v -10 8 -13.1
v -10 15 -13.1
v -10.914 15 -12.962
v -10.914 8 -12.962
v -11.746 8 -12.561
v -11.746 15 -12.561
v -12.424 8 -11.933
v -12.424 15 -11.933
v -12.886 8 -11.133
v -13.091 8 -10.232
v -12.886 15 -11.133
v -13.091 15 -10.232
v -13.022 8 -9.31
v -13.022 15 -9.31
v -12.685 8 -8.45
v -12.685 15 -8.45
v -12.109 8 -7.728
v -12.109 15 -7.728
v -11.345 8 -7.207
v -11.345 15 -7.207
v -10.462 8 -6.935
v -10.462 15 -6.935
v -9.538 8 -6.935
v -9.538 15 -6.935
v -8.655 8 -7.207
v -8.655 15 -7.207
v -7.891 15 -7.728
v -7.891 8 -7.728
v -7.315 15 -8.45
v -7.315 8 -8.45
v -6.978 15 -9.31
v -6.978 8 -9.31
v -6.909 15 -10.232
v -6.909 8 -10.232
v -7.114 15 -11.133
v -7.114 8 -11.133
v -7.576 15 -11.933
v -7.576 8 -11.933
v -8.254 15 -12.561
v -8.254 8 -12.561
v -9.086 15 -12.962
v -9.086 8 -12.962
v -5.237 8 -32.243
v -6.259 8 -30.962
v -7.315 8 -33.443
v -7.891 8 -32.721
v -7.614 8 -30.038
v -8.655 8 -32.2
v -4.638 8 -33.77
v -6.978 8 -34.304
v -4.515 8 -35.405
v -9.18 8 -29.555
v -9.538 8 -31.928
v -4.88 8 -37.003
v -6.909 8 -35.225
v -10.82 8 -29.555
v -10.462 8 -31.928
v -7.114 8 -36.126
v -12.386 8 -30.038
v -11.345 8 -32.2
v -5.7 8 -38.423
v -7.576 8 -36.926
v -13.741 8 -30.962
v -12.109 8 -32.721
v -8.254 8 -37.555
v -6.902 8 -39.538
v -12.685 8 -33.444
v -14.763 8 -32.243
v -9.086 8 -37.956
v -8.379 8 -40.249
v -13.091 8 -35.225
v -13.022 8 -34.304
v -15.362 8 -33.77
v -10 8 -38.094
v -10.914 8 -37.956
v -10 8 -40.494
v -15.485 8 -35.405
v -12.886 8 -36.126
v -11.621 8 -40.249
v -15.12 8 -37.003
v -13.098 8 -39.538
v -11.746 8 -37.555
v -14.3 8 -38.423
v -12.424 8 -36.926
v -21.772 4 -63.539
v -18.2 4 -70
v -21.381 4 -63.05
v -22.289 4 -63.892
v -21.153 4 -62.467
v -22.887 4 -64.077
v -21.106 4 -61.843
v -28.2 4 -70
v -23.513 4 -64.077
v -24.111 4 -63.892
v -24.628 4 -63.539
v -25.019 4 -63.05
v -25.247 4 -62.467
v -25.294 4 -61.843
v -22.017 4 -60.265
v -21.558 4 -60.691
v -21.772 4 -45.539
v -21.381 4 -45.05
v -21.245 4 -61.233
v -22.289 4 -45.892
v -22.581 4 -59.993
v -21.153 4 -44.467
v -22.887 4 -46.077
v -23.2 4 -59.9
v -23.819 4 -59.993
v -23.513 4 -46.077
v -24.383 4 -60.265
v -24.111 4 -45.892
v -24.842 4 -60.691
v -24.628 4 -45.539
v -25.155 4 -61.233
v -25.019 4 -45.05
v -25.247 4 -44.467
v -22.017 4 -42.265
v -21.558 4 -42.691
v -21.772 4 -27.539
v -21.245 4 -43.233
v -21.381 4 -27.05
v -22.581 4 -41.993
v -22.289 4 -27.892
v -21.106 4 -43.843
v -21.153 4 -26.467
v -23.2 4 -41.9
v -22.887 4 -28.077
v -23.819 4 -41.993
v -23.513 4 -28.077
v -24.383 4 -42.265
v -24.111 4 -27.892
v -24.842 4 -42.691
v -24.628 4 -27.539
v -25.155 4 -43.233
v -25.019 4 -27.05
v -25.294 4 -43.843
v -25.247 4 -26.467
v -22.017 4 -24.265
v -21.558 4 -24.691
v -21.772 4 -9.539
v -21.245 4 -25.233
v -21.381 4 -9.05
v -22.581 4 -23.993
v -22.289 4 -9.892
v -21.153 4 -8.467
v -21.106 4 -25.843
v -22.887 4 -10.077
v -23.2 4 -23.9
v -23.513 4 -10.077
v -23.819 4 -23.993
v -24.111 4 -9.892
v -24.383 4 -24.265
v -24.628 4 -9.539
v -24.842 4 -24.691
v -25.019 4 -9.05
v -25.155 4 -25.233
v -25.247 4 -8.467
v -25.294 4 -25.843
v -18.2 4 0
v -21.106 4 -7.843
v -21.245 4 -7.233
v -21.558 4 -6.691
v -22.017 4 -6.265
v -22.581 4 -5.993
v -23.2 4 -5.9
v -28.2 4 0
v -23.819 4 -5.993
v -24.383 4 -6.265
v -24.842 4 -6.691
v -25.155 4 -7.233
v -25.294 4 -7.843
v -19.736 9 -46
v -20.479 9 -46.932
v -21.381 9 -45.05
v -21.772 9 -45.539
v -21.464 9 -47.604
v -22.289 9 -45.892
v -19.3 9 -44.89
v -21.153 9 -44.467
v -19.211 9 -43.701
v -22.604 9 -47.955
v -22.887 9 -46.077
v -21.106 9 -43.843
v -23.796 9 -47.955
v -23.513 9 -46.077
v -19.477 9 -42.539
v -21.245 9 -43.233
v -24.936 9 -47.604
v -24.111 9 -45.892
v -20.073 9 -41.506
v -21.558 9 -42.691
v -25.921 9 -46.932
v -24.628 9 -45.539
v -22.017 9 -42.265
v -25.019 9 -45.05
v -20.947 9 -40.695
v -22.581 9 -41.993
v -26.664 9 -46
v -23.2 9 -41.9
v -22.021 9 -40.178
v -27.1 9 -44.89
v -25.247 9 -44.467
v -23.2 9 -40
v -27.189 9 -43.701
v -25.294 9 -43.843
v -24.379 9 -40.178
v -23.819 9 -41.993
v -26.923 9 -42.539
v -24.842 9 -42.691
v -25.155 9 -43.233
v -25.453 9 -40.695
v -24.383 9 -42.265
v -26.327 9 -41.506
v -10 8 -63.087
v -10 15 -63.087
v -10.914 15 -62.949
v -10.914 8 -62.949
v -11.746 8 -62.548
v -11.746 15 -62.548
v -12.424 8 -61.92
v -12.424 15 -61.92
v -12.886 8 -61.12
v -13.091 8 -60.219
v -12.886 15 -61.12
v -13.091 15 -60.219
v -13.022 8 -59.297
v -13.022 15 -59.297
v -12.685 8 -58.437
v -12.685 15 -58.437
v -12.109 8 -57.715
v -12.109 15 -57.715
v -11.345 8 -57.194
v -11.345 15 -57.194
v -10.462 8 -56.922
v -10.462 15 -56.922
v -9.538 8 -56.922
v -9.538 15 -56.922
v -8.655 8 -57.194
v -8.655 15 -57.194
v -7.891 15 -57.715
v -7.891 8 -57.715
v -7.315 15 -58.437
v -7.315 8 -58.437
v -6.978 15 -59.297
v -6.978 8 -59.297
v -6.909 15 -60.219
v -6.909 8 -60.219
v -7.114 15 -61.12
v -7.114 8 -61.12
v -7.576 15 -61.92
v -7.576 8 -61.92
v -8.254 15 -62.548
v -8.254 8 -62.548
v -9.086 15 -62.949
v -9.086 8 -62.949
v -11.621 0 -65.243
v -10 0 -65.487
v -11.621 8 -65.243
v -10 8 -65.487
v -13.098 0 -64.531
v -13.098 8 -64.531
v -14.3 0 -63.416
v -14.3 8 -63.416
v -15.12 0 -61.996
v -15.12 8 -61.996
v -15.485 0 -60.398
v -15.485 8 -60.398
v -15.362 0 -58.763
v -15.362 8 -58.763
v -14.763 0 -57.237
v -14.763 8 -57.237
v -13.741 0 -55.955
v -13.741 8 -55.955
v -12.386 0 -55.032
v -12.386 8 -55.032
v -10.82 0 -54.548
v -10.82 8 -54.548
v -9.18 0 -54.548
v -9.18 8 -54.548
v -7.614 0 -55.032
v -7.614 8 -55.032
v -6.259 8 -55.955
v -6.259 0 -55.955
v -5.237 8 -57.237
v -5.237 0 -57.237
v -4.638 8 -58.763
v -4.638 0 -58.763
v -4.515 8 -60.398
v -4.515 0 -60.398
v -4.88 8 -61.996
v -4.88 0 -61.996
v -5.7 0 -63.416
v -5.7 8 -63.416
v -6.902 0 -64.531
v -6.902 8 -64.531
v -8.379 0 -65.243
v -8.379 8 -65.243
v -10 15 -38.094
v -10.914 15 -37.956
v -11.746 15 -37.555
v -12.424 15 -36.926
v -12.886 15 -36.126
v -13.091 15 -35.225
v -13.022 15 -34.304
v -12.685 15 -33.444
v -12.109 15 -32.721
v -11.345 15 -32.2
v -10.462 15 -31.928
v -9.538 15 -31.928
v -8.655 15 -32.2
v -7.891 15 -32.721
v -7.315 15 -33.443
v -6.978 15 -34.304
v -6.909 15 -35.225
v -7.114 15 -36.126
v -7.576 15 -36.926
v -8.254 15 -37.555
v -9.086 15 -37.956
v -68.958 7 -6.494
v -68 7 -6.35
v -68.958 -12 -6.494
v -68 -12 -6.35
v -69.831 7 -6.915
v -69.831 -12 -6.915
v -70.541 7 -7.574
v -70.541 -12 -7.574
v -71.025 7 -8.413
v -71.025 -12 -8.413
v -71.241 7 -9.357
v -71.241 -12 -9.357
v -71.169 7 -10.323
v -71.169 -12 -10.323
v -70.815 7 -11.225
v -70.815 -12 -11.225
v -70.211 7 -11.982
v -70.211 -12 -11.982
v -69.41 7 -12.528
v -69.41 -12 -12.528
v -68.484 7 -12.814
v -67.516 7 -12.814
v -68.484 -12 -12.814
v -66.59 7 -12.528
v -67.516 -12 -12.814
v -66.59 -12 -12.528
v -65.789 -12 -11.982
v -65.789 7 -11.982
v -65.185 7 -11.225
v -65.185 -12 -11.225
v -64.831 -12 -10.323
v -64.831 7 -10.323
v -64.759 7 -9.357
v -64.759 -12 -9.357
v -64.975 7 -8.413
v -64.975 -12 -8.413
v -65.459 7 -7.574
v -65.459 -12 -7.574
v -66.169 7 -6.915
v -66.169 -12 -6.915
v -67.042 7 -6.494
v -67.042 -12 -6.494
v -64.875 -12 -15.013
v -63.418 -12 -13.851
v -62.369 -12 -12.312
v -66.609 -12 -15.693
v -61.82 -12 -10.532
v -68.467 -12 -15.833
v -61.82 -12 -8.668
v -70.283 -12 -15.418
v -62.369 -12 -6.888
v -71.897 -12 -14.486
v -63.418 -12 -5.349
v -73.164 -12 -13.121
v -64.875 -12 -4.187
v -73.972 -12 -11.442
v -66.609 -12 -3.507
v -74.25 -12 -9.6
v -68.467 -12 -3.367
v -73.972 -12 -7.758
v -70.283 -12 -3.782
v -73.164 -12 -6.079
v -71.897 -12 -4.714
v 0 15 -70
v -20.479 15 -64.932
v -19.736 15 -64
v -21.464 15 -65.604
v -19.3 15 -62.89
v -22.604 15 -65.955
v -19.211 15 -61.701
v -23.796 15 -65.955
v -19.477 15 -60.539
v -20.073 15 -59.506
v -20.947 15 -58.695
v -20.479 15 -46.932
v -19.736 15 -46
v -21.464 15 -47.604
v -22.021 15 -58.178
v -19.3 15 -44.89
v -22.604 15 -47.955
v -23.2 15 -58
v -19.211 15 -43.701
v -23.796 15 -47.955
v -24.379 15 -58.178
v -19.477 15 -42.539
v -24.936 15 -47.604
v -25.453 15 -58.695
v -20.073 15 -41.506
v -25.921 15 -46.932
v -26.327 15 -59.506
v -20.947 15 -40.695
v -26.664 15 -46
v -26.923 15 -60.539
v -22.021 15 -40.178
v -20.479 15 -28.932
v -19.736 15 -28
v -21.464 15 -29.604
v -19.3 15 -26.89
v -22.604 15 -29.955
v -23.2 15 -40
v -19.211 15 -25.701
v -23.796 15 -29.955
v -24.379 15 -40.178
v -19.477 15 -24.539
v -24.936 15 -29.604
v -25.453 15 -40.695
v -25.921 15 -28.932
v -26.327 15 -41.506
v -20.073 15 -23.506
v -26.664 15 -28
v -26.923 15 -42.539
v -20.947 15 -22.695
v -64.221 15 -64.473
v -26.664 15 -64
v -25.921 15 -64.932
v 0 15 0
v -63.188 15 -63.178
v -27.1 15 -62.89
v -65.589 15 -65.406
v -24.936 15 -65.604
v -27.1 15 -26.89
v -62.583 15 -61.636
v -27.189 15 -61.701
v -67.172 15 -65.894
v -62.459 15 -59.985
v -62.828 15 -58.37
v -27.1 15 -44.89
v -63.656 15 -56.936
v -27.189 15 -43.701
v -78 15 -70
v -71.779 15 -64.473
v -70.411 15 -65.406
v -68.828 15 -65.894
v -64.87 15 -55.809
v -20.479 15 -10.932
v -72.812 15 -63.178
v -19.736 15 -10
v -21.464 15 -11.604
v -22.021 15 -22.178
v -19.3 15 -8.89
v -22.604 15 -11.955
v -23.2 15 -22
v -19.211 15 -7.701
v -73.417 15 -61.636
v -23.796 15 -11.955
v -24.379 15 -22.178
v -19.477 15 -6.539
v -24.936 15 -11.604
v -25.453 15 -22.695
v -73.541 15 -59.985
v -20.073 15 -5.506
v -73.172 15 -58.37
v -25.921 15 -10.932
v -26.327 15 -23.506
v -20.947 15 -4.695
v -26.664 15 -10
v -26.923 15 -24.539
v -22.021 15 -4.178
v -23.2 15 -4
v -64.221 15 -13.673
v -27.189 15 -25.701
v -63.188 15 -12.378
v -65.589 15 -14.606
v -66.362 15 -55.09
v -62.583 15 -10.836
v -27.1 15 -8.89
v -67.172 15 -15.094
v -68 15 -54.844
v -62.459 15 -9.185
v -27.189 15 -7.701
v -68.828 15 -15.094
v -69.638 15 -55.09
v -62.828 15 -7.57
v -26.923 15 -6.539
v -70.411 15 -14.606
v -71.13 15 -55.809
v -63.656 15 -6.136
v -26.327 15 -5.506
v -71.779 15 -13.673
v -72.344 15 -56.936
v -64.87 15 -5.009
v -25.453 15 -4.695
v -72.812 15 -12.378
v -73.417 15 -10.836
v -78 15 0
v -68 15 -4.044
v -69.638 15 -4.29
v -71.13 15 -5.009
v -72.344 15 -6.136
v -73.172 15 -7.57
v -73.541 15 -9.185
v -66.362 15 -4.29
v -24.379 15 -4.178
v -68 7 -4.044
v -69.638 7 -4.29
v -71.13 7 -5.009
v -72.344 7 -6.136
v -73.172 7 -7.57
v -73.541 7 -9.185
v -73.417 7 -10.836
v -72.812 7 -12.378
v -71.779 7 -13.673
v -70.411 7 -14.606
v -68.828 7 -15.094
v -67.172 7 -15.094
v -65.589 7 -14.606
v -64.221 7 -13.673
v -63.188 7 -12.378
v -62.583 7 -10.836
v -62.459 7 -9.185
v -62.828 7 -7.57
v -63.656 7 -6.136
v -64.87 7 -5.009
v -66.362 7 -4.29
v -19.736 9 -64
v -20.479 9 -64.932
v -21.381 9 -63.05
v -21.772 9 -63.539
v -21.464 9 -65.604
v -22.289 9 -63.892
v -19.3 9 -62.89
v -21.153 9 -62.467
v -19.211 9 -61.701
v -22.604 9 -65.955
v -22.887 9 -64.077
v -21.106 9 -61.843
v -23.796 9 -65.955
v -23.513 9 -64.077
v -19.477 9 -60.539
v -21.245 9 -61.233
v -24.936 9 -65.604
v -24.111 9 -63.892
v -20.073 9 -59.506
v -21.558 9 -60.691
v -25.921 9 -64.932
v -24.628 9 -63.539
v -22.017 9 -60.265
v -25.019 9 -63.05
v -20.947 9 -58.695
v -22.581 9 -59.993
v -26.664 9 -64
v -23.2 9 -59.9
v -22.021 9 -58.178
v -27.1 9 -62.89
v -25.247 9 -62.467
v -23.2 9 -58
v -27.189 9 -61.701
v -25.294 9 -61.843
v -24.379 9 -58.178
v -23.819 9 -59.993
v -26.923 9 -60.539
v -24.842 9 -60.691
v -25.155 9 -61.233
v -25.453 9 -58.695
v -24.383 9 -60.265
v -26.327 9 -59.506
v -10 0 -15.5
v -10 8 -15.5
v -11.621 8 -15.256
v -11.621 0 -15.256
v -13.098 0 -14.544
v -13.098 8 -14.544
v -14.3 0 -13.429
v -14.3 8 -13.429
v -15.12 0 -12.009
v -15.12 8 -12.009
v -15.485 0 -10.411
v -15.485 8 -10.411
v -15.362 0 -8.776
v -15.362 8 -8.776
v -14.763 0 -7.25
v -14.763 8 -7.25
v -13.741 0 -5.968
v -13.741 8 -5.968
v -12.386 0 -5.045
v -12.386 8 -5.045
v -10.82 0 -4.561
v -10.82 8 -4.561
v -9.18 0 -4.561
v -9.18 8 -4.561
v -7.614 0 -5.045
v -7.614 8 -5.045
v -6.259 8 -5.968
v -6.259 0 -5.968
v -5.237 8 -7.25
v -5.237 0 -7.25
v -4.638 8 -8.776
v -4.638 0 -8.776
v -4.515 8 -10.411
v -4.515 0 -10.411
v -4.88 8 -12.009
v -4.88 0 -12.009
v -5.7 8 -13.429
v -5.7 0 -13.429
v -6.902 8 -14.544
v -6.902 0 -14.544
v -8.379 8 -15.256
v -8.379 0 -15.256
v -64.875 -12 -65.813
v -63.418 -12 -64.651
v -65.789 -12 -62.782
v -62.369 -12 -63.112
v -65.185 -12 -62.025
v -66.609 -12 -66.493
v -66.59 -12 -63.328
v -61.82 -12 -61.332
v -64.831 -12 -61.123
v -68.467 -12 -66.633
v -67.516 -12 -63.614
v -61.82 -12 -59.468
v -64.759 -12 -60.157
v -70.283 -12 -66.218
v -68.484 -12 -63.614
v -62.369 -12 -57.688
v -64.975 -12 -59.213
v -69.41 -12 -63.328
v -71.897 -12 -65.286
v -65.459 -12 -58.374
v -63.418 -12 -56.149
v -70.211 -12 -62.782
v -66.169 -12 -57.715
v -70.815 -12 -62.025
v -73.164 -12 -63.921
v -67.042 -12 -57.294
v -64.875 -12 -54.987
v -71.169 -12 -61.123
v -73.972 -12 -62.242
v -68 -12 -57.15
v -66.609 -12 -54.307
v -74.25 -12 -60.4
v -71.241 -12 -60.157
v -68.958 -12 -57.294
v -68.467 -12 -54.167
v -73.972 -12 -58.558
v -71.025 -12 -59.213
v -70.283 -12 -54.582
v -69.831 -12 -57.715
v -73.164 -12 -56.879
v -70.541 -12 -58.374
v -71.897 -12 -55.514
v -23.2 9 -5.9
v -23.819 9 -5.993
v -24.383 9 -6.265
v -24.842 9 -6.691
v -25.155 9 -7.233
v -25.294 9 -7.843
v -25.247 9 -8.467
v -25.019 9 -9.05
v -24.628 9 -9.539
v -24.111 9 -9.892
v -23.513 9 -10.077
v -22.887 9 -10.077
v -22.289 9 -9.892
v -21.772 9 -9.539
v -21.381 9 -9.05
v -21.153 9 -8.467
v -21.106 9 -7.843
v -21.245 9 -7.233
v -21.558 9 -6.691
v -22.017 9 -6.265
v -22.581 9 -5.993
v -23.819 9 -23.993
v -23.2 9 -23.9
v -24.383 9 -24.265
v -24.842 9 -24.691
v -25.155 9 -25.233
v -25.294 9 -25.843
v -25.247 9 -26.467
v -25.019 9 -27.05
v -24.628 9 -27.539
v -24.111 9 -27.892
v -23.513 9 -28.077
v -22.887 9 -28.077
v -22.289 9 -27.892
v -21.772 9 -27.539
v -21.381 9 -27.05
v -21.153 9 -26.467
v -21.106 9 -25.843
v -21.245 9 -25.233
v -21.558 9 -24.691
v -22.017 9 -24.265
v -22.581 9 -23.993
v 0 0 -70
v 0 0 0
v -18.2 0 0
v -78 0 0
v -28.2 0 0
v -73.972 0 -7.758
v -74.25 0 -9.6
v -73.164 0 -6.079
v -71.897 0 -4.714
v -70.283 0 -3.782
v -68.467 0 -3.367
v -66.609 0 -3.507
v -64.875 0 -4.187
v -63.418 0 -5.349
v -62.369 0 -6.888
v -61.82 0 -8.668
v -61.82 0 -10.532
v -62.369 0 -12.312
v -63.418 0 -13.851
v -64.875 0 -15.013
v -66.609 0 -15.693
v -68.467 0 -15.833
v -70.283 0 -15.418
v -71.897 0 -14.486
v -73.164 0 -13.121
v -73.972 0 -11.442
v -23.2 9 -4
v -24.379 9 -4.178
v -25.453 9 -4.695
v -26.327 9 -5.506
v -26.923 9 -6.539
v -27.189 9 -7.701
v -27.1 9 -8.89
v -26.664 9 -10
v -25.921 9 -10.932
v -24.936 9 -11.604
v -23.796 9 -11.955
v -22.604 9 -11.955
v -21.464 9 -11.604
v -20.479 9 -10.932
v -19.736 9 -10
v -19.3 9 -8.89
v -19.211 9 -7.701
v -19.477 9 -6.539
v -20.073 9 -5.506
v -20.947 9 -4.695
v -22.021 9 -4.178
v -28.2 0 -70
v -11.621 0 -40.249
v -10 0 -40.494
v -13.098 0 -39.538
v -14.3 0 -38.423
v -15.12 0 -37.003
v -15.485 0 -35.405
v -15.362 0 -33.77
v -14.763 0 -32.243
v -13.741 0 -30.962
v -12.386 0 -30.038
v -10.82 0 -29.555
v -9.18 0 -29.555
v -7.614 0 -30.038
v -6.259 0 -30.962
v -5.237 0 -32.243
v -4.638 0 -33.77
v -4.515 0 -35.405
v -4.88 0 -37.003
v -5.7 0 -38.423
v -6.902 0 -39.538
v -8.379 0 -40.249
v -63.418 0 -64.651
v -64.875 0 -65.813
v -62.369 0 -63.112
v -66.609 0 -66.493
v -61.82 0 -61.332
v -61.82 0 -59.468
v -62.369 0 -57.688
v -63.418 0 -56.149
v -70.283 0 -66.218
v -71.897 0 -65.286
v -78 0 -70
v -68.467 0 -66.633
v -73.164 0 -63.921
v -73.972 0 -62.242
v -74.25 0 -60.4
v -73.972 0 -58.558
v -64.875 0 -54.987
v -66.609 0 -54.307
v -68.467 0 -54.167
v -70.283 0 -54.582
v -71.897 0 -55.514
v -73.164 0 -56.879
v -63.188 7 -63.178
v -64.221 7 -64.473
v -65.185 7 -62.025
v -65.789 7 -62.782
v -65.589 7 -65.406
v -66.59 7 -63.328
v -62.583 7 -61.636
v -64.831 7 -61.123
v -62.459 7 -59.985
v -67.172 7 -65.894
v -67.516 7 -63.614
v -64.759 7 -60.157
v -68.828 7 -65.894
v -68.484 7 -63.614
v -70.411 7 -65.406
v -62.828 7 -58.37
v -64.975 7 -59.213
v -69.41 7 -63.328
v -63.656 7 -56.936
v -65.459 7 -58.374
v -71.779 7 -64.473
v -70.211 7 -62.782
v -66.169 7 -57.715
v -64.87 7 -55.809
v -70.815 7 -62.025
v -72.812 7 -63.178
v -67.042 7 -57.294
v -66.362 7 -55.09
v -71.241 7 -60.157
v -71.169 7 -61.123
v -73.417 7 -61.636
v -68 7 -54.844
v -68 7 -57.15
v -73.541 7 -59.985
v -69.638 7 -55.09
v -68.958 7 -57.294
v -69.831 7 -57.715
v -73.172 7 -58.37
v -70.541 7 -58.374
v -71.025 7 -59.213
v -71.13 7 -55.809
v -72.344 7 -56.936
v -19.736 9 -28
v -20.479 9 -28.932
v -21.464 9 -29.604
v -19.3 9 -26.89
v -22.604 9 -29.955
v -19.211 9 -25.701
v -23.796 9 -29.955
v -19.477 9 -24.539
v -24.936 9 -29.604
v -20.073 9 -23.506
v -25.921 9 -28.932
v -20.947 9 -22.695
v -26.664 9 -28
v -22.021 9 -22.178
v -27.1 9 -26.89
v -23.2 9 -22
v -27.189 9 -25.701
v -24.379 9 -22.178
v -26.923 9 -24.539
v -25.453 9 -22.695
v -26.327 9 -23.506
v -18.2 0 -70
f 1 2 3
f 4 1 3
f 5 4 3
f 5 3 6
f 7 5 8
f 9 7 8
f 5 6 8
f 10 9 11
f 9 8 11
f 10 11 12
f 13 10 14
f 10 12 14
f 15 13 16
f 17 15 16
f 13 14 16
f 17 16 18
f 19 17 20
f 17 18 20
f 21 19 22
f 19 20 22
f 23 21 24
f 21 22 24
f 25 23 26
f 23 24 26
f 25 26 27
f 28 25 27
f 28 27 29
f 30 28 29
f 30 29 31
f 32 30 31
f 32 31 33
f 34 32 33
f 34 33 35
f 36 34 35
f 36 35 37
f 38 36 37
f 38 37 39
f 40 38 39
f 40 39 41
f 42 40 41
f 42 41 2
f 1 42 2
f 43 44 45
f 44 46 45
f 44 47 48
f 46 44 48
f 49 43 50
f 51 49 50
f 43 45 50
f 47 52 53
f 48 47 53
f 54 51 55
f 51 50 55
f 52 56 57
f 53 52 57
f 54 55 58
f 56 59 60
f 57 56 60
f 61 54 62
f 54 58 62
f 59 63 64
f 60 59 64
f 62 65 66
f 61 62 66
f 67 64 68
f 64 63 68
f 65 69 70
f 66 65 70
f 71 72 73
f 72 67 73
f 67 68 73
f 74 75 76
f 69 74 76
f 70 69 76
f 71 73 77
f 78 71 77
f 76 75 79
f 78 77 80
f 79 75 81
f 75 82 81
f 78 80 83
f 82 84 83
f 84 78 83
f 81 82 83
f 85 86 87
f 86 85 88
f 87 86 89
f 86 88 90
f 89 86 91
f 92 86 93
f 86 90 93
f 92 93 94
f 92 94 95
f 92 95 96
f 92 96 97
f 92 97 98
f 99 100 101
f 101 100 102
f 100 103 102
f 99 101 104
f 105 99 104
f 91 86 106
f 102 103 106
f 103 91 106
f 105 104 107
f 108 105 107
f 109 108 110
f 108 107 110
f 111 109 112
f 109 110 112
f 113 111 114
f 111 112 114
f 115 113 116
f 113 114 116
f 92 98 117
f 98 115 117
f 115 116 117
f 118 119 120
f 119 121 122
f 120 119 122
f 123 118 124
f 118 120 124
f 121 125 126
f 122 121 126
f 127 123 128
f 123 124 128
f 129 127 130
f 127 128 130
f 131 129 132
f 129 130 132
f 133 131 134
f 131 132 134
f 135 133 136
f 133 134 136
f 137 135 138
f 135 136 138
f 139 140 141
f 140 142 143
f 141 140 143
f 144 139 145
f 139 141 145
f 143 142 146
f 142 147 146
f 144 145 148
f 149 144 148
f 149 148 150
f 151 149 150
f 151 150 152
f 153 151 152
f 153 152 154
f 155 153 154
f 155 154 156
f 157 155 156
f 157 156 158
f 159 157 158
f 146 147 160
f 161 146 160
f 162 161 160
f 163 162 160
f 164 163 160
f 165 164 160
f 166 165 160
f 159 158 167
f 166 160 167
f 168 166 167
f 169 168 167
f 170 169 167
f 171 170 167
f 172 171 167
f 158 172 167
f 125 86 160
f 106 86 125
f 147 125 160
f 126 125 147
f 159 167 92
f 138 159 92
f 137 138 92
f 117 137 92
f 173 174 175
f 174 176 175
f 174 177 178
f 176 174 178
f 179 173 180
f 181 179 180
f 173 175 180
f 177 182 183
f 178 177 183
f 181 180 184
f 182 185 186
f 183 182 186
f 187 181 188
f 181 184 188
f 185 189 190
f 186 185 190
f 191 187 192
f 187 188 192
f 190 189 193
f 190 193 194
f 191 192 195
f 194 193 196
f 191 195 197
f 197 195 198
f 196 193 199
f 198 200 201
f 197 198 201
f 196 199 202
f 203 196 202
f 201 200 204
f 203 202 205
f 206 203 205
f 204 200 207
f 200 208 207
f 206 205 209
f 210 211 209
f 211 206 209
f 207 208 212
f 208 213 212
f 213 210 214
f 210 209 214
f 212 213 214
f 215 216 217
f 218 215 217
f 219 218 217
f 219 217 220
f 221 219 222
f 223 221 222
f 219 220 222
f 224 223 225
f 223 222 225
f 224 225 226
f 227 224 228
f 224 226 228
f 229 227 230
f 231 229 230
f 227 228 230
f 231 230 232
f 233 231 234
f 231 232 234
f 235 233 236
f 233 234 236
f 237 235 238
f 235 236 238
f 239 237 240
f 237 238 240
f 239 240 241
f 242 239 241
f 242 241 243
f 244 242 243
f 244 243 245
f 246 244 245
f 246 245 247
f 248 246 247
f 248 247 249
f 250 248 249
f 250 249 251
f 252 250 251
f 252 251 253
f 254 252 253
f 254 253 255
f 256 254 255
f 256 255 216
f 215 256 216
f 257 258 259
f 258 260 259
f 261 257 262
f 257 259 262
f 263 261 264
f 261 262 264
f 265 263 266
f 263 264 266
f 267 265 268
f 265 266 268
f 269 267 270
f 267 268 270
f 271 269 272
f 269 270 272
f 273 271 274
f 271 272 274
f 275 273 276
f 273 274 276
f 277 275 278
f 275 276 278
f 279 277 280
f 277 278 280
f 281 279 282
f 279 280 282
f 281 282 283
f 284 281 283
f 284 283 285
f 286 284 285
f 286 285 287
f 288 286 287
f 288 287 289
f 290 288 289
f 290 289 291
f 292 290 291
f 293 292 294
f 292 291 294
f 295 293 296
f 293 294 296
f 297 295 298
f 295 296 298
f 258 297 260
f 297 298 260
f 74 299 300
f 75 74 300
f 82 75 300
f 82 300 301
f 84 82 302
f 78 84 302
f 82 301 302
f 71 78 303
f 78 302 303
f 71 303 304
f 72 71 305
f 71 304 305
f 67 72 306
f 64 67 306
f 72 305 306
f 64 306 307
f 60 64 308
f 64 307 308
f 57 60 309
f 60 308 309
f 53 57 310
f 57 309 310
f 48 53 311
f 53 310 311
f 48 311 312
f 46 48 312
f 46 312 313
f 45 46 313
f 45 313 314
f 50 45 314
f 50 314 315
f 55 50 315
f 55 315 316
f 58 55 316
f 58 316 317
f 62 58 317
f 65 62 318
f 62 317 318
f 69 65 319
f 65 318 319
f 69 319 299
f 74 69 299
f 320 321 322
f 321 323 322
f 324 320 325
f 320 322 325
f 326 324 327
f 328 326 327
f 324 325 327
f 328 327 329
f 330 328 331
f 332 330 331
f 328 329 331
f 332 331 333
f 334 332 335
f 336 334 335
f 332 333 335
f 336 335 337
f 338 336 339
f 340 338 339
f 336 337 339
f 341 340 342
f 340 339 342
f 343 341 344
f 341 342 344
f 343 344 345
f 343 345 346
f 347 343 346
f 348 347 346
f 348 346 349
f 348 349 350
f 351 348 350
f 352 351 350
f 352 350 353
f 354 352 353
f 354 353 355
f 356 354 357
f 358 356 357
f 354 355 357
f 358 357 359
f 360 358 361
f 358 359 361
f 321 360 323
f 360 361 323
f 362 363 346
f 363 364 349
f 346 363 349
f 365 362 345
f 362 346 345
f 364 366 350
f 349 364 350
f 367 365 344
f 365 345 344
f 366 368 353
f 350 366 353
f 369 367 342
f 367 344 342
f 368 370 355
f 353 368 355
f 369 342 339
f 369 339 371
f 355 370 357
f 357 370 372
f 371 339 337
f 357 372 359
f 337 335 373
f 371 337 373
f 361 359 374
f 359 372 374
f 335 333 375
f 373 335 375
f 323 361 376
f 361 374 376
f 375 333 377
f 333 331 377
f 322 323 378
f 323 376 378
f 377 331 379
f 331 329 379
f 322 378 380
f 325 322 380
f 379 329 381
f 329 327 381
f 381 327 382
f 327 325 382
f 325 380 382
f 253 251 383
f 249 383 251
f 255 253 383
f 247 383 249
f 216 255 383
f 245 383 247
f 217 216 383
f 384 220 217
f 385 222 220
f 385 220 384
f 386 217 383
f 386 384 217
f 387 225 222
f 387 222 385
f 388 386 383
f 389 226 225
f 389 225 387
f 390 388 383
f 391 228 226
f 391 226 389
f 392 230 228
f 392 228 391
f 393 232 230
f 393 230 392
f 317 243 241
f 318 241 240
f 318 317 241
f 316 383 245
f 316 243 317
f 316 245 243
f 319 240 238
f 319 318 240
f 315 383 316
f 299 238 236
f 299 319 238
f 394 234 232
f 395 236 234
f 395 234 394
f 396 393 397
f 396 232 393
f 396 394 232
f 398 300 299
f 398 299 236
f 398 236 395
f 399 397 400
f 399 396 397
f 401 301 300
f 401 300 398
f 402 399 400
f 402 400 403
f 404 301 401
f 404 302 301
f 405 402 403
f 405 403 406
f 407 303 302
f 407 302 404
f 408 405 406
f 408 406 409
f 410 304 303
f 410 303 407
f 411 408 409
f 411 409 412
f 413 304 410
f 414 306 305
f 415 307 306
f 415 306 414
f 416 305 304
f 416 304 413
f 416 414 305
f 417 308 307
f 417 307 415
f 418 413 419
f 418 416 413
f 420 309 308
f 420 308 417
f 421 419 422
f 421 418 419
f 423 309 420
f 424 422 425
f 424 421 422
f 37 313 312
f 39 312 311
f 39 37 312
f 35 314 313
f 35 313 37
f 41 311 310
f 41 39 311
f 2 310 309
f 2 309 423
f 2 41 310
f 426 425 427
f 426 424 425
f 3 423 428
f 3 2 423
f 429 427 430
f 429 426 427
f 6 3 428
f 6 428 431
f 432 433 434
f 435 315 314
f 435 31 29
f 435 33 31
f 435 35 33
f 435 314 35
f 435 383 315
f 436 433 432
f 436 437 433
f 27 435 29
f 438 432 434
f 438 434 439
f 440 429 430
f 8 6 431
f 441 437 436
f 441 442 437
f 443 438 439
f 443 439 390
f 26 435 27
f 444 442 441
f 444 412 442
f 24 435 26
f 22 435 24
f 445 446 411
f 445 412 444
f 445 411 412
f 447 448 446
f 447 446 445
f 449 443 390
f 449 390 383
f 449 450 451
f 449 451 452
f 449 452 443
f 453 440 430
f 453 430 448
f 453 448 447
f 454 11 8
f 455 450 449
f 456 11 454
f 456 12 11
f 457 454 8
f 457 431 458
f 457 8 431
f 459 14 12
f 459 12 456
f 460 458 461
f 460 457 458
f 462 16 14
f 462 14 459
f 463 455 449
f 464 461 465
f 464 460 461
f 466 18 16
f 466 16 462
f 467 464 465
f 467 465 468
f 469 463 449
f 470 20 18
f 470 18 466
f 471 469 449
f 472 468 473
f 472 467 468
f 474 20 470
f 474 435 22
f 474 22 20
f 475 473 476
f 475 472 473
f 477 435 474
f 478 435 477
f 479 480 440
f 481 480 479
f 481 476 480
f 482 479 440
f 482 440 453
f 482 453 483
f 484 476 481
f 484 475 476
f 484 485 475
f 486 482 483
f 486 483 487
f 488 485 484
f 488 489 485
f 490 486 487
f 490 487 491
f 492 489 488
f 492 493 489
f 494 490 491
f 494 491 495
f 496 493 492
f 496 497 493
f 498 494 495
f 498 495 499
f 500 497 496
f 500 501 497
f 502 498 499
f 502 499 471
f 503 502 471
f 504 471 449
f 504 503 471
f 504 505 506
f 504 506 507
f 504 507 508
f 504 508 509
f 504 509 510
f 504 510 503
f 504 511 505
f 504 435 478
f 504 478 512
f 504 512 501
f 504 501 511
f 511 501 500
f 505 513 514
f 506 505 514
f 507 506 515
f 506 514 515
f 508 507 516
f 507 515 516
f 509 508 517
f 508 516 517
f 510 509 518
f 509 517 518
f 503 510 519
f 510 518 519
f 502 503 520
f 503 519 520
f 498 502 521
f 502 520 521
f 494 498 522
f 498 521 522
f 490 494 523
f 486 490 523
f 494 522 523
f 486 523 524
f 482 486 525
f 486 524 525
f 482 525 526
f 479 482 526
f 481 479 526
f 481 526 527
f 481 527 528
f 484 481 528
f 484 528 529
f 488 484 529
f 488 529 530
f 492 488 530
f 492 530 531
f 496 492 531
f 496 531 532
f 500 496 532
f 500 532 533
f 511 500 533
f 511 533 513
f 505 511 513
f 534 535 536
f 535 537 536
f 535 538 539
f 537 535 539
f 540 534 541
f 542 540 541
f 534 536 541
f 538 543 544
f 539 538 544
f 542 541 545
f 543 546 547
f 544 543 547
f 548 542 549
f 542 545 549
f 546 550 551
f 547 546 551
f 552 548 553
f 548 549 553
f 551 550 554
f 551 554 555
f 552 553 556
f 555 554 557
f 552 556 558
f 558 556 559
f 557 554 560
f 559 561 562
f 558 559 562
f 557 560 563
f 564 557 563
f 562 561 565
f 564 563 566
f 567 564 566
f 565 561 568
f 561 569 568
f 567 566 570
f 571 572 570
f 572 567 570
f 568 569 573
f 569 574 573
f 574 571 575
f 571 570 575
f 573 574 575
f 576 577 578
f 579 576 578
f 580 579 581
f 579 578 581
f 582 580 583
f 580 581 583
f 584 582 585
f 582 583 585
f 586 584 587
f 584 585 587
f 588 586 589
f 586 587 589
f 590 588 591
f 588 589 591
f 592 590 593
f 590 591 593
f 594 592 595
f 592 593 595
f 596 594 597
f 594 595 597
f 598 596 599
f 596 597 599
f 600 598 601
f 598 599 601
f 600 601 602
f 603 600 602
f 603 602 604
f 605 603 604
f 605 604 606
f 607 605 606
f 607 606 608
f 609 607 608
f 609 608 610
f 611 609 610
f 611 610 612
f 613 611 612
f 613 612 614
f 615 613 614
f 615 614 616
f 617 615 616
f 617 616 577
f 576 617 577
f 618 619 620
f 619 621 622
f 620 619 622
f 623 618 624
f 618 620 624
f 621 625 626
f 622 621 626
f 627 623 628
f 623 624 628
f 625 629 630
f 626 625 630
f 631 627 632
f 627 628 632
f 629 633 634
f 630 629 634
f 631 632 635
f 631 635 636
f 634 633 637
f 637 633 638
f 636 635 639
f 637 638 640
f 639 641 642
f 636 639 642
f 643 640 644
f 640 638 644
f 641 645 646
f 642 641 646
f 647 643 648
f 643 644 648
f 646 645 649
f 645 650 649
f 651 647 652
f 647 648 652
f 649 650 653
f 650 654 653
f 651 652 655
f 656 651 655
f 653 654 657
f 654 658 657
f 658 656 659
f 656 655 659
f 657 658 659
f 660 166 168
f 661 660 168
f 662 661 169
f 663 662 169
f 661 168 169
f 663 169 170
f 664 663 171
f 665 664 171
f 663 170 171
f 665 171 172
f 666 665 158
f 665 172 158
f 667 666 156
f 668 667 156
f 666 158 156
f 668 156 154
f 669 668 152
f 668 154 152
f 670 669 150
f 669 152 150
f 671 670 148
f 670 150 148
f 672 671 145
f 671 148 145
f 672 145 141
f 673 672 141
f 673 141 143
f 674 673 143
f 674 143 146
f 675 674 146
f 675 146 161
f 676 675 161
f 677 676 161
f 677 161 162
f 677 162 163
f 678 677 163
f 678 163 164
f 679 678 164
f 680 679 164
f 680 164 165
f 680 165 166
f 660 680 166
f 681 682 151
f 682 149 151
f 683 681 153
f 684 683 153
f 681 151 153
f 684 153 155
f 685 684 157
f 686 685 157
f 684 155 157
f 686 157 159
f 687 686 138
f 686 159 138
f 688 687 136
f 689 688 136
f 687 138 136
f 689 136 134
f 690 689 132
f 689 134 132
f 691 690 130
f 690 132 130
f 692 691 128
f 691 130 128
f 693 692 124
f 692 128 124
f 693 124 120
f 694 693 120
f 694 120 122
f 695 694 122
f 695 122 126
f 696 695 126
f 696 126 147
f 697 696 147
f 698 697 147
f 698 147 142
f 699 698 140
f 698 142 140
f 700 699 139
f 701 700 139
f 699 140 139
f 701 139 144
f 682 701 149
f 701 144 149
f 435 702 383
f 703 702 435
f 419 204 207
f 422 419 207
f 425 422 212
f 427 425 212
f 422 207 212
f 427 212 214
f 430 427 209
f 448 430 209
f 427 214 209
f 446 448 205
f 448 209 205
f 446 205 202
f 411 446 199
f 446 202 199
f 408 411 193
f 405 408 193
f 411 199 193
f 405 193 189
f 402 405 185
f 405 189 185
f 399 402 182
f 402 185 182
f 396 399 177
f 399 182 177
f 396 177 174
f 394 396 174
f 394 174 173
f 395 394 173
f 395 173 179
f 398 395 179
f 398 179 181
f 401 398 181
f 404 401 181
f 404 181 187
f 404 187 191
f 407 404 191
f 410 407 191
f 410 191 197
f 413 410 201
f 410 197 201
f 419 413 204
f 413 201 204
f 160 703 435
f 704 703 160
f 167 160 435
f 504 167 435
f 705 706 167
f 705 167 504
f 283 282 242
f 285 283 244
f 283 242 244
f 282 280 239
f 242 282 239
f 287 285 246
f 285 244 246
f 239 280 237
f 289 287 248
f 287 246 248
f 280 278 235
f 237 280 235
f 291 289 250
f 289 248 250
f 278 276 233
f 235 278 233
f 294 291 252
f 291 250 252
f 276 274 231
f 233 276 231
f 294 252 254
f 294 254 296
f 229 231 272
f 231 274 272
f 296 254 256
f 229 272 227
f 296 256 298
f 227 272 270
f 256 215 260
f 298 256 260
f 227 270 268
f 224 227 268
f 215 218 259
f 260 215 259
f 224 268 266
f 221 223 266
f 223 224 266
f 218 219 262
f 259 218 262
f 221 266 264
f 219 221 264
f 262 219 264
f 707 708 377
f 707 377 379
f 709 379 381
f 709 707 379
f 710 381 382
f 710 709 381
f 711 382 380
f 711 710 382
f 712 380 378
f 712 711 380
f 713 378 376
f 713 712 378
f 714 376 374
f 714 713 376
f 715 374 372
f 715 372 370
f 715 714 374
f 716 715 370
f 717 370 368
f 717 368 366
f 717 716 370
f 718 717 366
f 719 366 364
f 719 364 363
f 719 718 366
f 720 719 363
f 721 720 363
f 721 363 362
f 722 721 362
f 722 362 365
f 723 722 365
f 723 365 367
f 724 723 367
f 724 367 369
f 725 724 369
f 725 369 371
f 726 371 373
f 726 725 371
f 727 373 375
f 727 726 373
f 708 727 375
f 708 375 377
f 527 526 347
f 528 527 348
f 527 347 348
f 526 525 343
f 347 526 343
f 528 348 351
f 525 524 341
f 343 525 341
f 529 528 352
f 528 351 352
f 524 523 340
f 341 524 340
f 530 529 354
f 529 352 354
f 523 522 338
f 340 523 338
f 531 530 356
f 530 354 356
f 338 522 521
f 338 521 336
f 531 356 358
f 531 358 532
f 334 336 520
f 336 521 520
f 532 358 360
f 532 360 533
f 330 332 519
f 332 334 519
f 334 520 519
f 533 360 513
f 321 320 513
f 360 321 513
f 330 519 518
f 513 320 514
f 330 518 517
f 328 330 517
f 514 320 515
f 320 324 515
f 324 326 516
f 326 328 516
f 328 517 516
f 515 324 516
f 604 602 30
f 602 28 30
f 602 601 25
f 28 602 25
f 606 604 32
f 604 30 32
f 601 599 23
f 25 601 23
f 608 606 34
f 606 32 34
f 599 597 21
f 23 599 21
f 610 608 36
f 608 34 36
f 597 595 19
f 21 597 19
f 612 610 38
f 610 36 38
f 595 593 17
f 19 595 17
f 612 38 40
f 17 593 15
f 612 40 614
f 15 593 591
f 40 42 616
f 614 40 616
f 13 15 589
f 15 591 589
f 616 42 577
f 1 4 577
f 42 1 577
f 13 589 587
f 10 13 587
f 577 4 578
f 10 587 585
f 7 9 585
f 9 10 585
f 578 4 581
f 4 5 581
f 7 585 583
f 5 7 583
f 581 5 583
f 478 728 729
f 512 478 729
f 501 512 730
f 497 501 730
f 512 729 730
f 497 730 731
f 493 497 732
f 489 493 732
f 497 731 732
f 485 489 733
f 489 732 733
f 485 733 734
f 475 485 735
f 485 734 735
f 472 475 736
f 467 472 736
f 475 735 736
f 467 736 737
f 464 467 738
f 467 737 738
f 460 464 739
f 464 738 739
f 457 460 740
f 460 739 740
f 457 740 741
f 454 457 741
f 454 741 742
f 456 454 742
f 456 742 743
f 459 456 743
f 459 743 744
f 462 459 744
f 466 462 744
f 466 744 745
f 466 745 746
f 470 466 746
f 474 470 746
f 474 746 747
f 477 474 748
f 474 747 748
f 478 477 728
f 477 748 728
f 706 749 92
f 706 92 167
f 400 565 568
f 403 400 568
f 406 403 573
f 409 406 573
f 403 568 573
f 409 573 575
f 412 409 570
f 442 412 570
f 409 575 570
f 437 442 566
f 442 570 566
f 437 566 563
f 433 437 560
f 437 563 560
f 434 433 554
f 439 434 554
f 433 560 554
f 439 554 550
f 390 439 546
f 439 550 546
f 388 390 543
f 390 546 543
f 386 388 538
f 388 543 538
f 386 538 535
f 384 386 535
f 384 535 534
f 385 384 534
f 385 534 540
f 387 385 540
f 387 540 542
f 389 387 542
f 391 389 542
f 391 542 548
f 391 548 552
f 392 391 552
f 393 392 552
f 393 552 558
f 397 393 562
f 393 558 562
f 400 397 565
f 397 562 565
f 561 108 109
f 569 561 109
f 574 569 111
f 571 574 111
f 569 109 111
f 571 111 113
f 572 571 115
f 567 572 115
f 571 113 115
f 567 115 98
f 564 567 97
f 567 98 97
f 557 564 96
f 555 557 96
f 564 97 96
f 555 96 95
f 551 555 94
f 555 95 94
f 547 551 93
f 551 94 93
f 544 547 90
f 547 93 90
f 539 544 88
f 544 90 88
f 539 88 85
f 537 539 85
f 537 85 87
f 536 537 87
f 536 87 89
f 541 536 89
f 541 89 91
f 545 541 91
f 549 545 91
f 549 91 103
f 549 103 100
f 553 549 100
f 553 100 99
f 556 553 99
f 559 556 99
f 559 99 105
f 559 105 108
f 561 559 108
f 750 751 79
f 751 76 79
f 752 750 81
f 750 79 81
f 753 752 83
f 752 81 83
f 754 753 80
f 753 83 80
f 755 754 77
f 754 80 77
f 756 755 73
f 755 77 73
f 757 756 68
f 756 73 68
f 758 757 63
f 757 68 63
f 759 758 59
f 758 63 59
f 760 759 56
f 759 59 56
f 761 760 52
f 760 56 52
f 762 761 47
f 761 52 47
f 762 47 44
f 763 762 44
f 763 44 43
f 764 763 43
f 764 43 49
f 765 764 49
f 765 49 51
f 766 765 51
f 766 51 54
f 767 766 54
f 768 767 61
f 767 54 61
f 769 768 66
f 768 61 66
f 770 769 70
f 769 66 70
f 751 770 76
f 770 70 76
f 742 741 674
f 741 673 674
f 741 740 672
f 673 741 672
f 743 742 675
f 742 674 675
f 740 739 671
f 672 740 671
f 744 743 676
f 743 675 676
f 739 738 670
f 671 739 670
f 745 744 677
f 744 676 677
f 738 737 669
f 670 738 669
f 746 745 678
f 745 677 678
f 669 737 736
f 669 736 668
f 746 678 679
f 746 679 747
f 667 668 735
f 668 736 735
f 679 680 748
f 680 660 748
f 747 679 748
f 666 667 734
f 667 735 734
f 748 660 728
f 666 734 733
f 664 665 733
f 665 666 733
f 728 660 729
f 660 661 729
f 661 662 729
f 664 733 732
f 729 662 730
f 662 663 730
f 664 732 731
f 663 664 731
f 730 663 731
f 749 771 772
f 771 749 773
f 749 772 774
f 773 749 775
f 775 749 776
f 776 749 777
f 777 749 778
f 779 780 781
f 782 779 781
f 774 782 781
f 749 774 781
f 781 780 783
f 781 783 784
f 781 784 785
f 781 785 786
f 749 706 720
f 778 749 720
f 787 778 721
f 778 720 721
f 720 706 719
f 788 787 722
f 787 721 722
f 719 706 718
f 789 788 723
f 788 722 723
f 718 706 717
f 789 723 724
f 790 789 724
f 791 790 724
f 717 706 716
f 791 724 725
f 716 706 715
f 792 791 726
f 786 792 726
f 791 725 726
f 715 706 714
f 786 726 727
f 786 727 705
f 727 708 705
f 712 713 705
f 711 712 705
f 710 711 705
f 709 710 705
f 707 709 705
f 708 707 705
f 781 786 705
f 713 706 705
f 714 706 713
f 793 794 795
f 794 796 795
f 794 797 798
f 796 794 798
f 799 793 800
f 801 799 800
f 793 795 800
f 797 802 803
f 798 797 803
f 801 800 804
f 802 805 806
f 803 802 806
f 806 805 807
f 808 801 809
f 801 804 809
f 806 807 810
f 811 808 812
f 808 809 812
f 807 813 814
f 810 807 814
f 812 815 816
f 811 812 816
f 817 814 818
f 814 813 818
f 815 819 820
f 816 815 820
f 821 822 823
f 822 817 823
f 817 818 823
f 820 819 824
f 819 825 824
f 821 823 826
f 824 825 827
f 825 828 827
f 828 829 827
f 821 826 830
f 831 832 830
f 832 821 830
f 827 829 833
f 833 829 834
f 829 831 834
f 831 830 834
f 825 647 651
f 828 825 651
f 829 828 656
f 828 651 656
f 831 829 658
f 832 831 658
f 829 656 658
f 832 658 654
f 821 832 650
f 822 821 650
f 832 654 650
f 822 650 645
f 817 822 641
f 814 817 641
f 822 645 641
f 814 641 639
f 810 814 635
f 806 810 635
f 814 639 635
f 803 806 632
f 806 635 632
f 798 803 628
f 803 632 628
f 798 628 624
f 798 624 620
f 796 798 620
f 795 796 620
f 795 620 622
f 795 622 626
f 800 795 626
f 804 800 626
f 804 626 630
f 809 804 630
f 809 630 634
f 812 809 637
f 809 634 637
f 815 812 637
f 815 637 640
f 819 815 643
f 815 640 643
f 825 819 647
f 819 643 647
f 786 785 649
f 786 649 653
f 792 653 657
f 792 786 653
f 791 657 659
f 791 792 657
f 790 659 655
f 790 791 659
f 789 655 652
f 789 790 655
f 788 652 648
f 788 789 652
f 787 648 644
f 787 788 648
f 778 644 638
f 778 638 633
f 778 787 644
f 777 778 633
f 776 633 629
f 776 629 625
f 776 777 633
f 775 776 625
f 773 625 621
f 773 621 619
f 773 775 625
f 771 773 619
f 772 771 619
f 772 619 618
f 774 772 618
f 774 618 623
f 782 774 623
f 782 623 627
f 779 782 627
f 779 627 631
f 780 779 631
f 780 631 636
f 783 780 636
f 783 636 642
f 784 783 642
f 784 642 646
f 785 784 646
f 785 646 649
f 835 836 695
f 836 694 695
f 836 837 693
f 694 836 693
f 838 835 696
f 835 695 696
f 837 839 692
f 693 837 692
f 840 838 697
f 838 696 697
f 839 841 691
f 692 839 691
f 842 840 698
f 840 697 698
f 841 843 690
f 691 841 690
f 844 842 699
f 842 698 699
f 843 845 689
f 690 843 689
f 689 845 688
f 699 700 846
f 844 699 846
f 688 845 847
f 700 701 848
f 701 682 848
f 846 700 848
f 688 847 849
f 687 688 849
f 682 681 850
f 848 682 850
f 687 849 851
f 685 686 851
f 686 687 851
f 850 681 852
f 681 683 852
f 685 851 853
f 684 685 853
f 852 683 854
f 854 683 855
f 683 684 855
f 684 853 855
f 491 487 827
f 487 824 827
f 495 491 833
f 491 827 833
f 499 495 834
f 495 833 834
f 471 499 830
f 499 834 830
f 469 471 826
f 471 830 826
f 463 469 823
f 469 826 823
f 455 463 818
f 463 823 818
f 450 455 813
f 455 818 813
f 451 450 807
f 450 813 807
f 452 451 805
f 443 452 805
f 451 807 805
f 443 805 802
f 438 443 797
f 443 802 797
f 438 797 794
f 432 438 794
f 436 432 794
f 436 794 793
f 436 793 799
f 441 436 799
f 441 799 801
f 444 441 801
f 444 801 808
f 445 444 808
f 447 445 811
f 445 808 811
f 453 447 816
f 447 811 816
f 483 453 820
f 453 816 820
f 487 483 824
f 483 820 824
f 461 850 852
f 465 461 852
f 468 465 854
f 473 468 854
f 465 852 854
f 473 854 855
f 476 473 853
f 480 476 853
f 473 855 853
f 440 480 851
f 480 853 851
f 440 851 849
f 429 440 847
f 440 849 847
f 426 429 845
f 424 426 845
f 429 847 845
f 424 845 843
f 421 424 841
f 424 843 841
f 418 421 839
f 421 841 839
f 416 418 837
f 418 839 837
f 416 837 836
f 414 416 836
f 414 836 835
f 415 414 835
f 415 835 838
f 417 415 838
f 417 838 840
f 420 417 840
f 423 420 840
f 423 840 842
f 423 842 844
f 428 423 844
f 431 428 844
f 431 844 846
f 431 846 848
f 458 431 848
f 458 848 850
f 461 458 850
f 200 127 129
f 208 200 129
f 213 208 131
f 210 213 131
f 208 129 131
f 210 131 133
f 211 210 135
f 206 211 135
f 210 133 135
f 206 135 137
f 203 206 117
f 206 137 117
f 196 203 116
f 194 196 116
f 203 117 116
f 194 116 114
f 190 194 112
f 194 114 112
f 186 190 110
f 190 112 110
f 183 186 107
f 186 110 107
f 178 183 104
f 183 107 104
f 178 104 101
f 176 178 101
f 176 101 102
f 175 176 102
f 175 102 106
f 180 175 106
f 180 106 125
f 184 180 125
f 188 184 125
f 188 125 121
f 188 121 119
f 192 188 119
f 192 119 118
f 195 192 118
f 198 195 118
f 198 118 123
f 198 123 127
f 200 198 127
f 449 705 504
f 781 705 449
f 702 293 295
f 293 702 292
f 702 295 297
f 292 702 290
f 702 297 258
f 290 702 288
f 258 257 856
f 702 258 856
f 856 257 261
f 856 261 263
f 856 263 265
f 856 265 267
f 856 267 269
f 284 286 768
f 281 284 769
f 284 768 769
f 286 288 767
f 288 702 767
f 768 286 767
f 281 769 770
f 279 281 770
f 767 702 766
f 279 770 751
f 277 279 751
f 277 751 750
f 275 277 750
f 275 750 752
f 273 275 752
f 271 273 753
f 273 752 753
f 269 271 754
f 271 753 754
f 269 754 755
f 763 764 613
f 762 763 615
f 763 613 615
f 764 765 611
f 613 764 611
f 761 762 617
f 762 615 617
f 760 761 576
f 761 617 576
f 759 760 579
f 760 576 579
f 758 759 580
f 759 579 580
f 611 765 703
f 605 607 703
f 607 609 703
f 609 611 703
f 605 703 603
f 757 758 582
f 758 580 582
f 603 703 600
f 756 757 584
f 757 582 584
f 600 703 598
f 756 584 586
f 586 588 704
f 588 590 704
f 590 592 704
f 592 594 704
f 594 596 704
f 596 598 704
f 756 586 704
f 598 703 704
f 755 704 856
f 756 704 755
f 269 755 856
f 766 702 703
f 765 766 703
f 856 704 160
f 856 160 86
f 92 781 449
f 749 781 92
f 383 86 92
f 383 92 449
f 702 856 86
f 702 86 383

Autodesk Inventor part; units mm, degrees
ref_plane "YZ Plane" through (0, 0, 0) normal (1, 0, 0) x (0, 1, 0)
ref_plane "XZ Plane" through (0, 0, 0) normal (0, 1, 0) x (-1, 0, 0)
ref_plane "XY Plane" through (0, 0, 0) normal (0, 0, 1) x (1, 0, 0)
sketch "Sketch1" plane through (0, 0, 0) normal (0, 1, 0) x (-1, 0, 0)
  line L0 (0, 0) -> (78, 0)
  line L1 (78, 0) -> (78, -70)
  line L2 (78, -70) -> (0, -70)
  line L3 (0, -70) -> (0, 0)
  line L4 (0, 0) -> (10, 0)
  line L5 (10, 0) -> (10, -70)
  line L6 (10, -70) -> (0, -70)
  line L7 (0, -70) -> (0, 0)
  line L8 (10, 0) -> (10, -10)
  line L9 (10, -10) -> (10, -34.9935)
  line L10 (10, -34.9935) -> (10, -59.987)
  line L11 (78, -70) -> (68, -70)
  line L12 (68, -70) -> (68, 0)
  line L13 (68, 0) -> (78, 0)
  line L14 (78, 0) -> (78, -70)
  line L15 (68, -70) -> (68, -60.4)
  line L16 (68, -60.4) -> (68, -9.6)
  circle A0 centre (68, -60.4) radius 6.25
  circle A1 centre (68, -9.6) radius 6.25
  line L17 (0, 0) -> (18.2, 0)
  line L18 (18.2, 0) -> (18.2, -70)
  line L19 (18.2, -70) -> (0, -70)
  line L20 (0, -70) -> (0, 0)
  line L21 (18.2, -70) -> (28.2, -70)
  line L22 (28.2, -70) -> (28.2, 0)
  line L23 (28.2, 0) -> (18.2, 0)
  line L24 (18.2, 0) -> (18.2, -70)
  dimension "d0" = 78
  dimension "d1" = 70
  dimension "d2" = 10
  dimension "d3" = 10
  dimension "d4" = 24.9935
  dimension "d5" = 24.9935
  dimension "d27" = 10
  dimension "d28" = 9.6
  dimension "d29" = 50.8
  dimension "d30" = 12.5
  dimension "d31" = 12.5
  dimension "d49" = 18.2
  dimension "d50" = 10
extrude "Extrusion1" add sketch "Sketch1" along normal blind 15
sketch "Sketch2" plane through (0, 15, 0) normal (0, 1, 0) x (1, 0, 0)
  line L0 (-78, 70) -> (-78, 0) projected
  line L1 (-78, 0) -> (0, 0) projected
  line L2 (-78, 70) -> (-68, 70)
  line L3 (-68, 70) -> (-68, 0)
  line L4 (-68, 0) -> (-78, 0)
  line L5 (-78, 0) -> (-78, 70)
  line L6 (-68, 70) -> (-68, 60.4)
  line L7 (-68, 60.4) -> (-68, 9.6)
  line L8 (0, 70) -> (-78, 70) projected
  line L9 (-68, 0) -> (-28.2, 0)
  line L10 (-28.2, 0) -> (-28.2, 70)
  line L11 (-28.2, 70) -> (-68, 70)
  line L12 (-68, 70) -> (-68, 0)
  line L13 (-28.2, 70) -> (-18.2, 70)
  line L14 (-18.2, 70) -> (-18.2, 0)
  line L15 (-18.2, 0) -> (-28.2, 0)
  line L16 (-28.2, 0) -> (-28.2, 70)
  line L17 (-28.2, 0) -> (-23.2, 0)
  line L18 (-23.2, 0) -> (-23.2, 70)
  line L19 (-23.2, 70) -> (-28.2, 70)
  line L20 (-28.2, 70) -> (-28.2, 0)
  line L21 (-23.2, 0) -> (-23.2, 8)
  line L22 (-23.2, 8) -> (-23.2, 26)
  line L23 (-23.2, 26) -> (-23.2, 44)
  line L24 (-23.2, 44) -> (-23.2, 62)
  line L25 (-23.2, 62) -> (-23.2, 70)
  point P0 (-28.2, 0)
  dimension "d15" = 10
  dimension "d16" = 9.6
  dimension "d17" = 50.8
  dimension "d25" = 39.8
  dimension "d26" = 10
  dimension "d36" = 5
  dimension "d37" = 8
  dimension "d38" = 18
  dimension "d39" = 18
  dimension "d40" = 18
  dimension "d41" = 8
extrude "Extrusion2" add sketch "Sketch1" against normal blind 12 contours A1 L12 | L12 A1 | A0 L12 | L12 A0
hole "Hole1" at (-10, 0, -10) at (-10, 0, -34.9935) at (-10, 0, -59.987) direction (0, 1, 0) diameter 6.2 end through all counterbore diameter 11 counterbore depth 8 clearance for "Socket Head Cap Screw" size "M6" standard "Ansi Metric M Profile"
hole "Hole2" at (-68, 15, -60.4) at (-68, 15, -9.6) direction (0, -1, 0) diameter 6.5 end through all counterbore diameter 11.113 counterbore depth 8 clearance for "Socket Head Cap Screw" size "1/4" standard "Ansi Unified Screw Threads"
hole "Hole3" at (-23.2, 15, -62) at (-23.2, 15, -44) at (-23.2, 15, -26) at (-23.2, 15, -8) direction (0, -1, 0) diameter 4.2 end through all counterbore diameter 8 counterbore depth 6 clearance for "Socket Head Cap Screw" size "M4" standard "Ansi Metric M Profile"
extrude "Extrusion4" cut sketch "Sketch1" along normal blind 4 contours L0 L22 L2 L18
properties part number "CameraAdapter_part1"
